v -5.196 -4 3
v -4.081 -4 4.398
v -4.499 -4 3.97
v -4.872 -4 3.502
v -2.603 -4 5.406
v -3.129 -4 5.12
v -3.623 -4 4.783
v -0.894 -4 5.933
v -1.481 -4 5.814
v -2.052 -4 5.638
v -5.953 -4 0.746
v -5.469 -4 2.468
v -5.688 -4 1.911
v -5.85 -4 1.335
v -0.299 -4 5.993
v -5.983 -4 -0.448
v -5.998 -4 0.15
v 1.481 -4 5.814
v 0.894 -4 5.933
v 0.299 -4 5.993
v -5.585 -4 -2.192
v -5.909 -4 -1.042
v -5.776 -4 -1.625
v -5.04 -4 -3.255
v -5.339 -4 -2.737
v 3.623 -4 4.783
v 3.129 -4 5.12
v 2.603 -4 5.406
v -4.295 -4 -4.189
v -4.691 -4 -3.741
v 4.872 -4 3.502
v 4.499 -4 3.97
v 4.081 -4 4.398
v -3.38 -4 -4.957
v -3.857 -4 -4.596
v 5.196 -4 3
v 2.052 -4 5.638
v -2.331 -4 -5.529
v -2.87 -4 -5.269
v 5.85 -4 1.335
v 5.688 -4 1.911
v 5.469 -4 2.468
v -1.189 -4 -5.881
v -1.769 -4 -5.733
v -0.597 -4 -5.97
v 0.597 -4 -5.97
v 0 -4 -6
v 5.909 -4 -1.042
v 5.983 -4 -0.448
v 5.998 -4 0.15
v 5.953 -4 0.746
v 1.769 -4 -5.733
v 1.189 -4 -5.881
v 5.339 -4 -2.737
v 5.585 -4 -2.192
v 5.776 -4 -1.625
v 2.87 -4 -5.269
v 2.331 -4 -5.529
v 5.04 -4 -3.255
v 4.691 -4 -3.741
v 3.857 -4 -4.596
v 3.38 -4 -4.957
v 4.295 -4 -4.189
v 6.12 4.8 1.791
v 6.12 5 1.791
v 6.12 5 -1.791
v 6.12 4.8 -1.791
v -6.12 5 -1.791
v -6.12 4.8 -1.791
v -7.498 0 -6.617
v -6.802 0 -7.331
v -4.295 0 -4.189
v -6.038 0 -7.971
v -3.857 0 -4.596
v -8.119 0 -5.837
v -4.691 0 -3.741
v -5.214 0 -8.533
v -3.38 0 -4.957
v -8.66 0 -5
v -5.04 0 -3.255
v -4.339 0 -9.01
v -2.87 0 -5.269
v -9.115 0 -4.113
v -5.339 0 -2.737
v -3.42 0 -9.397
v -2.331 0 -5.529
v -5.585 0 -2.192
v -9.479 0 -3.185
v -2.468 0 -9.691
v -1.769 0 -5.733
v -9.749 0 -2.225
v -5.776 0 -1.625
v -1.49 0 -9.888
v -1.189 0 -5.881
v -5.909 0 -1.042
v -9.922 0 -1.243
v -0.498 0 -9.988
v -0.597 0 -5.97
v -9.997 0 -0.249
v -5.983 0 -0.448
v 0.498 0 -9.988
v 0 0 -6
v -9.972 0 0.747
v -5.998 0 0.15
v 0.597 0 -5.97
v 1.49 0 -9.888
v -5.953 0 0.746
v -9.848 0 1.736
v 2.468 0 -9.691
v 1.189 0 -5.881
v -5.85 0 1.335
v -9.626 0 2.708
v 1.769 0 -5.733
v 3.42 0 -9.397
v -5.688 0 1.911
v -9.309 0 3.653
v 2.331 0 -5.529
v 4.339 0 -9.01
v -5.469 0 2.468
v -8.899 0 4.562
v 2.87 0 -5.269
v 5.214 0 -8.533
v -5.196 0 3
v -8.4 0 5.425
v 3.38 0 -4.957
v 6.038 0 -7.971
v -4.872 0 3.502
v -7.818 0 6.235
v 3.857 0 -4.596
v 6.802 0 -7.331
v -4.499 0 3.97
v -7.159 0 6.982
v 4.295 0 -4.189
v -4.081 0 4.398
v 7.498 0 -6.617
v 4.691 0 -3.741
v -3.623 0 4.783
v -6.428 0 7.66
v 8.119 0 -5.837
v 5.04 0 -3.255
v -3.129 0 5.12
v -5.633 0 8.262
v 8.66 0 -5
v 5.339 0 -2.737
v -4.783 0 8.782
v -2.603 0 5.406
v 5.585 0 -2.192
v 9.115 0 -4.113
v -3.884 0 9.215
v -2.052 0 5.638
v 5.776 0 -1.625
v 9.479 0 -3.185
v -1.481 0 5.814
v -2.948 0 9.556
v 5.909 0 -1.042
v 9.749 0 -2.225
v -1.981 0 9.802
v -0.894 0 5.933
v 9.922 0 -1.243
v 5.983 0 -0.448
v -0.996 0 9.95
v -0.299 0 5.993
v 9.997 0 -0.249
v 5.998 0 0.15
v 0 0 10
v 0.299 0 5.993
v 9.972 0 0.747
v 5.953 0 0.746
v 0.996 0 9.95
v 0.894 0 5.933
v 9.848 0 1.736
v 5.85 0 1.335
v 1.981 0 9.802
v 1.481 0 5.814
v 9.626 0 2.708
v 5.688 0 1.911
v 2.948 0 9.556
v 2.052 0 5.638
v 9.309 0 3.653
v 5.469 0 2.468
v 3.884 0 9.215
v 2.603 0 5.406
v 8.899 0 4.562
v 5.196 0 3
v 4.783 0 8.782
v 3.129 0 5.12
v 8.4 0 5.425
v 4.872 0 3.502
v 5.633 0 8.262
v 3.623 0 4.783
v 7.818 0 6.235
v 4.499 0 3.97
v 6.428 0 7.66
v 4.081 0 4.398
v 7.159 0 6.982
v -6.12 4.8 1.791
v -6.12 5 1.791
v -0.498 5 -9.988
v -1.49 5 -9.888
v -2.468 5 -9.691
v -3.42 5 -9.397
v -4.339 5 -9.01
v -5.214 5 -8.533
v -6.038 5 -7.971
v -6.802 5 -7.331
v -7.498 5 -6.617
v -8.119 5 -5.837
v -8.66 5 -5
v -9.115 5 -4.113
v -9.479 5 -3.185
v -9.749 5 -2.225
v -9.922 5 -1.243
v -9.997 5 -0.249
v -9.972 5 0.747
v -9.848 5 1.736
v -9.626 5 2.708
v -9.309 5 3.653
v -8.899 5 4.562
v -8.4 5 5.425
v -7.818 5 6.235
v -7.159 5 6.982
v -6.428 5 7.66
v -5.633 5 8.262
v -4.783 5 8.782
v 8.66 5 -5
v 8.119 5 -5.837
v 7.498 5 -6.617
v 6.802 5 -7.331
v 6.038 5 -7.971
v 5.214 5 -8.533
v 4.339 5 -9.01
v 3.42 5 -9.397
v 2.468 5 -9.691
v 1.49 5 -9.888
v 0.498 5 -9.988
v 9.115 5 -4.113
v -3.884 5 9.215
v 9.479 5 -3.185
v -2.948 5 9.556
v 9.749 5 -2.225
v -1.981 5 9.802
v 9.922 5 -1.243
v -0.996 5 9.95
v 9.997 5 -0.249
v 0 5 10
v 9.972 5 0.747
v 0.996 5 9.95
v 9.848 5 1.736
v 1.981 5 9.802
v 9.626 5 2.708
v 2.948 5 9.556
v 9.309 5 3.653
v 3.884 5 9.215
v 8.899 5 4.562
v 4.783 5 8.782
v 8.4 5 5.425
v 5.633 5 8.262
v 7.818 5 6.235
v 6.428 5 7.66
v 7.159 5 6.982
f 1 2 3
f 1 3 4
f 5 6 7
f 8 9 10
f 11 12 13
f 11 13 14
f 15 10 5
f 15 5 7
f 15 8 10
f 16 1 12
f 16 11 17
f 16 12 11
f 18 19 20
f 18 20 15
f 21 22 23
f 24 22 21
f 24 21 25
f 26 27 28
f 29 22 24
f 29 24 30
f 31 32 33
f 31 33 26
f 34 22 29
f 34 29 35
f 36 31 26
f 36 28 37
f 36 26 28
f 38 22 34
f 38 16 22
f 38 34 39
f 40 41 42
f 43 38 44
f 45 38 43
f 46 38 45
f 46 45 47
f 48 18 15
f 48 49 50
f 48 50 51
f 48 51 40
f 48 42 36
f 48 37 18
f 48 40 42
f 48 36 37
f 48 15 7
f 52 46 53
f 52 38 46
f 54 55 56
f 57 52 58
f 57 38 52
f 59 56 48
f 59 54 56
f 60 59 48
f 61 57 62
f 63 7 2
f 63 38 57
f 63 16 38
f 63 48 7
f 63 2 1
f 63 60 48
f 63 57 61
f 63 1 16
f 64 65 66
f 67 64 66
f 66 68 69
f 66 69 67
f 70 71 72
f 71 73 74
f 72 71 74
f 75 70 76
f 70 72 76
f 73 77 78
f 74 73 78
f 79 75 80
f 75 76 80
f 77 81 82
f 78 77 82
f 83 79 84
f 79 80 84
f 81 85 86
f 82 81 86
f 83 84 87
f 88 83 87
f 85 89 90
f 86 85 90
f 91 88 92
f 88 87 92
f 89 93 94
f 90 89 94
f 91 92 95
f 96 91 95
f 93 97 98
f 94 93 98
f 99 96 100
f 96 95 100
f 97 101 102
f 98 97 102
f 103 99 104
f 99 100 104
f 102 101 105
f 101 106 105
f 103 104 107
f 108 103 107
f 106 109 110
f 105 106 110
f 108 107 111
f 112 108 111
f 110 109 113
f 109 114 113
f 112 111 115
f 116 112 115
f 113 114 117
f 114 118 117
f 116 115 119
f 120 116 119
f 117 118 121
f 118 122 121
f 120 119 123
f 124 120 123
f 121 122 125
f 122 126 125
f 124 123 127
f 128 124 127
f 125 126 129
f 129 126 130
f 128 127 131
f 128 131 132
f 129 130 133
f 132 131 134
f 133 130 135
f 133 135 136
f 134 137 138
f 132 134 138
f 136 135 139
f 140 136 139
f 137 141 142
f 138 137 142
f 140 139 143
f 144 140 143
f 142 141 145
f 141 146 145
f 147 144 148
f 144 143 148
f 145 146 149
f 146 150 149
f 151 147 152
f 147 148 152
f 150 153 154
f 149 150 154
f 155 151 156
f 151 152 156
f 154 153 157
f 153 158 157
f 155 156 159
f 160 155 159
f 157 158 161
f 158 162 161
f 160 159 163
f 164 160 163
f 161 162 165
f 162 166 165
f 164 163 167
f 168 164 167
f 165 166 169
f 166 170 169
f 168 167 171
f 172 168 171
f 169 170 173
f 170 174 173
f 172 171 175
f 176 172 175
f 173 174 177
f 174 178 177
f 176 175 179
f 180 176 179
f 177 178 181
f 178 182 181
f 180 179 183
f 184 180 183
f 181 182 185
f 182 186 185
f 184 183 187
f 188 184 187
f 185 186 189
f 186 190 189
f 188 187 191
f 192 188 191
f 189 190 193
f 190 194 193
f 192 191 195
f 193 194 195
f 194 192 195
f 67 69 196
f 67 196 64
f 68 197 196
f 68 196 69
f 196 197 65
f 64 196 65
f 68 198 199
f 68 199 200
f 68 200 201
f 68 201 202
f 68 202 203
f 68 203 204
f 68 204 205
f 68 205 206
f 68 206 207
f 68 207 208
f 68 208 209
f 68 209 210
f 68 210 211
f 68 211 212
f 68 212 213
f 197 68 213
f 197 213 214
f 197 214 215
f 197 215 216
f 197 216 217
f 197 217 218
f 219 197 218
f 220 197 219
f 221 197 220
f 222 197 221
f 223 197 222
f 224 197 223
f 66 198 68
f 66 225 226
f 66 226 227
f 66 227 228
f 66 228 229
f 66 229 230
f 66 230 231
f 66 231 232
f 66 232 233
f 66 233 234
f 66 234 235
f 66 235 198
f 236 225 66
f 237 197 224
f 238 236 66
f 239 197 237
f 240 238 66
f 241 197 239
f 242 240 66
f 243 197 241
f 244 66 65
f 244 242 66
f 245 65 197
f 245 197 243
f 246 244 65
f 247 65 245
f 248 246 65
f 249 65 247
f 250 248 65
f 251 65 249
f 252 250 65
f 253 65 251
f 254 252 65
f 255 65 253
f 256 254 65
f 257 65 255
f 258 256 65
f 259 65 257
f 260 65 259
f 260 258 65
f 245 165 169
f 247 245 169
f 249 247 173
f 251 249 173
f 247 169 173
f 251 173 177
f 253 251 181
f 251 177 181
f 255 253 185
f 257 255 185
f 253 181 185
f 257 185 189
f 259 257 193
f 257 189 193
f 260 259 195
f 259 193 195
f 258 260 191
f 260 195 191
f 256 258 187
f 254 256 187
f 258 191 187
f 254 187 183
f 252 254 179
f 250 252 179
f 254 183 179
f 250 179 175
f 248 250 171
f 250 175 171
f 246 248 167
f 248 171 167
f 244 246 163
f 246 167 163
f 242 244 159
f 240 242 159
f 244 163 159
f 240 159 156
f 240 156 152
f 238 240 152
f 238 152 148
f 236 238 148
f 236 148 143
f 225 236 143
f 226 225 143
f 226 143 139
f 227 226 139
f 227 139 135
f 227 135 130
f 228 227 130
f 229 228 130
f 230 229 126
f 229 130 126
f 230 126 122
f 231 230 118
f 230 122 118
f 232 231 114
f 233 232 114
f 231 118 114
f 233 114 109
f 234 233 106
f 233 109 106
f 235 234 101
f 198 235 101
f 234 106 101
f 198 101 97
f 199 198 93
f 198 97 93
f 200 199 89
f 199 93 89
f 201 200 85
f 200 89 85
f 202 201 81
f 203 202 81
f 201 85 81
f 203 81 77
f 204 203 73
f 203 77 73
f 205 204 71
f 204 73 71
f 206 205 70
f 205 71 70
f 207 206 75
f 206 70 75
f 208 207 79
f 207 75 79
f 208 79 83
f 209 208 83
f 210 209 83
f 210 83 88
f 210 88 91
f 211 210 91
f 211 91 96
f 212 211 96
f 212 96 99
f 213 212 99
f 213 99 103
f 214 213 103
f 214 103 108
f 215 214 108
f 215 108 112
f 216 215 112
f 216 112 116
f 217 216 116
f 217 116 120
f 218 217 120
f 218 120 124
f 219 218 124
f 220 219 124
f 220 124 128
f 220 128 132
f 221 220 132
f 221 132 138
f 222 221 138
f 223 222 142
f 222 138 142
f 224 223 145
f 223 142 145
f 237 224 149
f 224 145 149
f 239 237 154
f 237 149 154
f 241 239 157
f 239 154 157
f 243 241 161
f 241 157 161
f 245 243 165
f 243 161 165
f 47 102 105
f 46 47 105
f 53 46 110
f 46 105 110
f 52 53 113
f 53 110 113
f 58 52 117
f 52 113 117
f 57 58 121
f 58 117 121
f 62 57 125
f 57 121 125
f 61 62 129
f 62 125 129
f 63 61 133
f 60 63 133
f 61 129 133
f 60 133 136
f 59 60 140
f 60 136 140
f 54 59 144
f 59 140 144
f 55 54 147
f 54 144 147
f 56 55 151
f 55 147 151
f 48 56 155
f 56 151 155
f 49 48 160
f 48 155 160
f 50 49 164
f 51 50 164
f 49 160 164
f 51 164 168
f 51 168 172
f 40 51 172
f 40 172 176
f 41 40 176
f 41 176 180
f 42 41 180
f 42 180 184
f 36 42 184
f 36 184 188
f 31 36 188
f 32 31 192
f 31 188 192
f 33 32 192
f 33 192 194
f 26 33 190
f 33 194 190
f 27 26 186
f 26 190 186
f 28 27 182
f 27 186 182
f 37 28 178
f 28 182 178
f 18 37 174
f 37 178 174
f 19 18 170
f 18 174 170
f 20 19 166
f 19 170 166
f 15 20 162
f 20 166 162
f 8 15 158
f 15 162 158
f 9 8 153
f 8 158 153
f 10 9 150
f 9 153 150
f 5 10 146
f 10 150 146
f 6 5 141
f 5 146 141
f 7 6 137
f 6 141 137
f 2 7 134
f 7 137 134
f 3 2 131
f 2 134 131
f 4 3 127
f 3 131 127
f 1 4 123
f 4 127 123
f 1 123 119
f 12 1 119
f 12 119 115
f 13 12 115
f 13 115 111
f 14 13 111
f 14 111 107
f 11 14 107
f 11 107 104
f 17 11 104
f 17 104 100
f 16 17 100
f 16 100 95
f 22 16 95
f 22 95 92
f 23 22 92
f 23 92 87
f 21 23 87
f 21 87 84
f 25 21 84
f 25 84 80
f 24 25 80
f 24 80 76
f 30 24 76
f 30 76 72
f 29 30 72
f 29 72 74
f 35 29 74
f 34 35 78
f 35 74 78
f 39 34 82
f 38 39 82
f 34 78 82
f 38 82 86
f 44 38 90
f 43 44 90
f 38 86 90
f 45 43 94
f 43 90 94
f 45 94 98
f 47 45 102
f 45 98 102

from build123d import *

# Parameters (mm, degrees)
SKETCH_1_R          = 10
EXTRUDE_1_DEPTH     = 5
SKETCH_2_R          = 6
EXTRUDE_2_DEPTH     = 4
SKETCH_3_W          = 12.239393476
SKETCH_3_H          = 3.581573668
CUT_EXTRUDE_1_DEPTH = 0.2


with BuildPart() as part:
    # 草图1 → 凸台-拉伸1 (new body)
    with BuildSketch(Plane(origin=(0, 0, 0), x_dir=(1, 0, 0), z_dir=(0, 1, 0))):
        with Locations(Location((0, 0, 0), (0, 0, 270))):
            Circle(SKETCH_1_R)
    extrude(amount=EXTRUDE_1_DEPTH)

    # 草图2 → 凸台-拉伸2 (add)
    with BuildSketch(Plane.XZ):
        with Locations(Location((0, 0, 0), (0, 0, 270))):
            Circle(SKETCH_2_R)
    extrude(amount=EXTRUDE_2_DEPTH)

    # 草图3 → 切除-拉伸1 (cut)
    with BuildSketch(Plane(origin=(0, 5, 0), x_dir=(1, 0, 0), z_dir=(0, 1, 0))):
        Rectangle(SKETCH_3_W, SKETCH_3_H)
    extrude(amount=-CUT_EXTRUDE_1_DEPTH, mode=Mode.SUBTRACT)


solid = part.part
